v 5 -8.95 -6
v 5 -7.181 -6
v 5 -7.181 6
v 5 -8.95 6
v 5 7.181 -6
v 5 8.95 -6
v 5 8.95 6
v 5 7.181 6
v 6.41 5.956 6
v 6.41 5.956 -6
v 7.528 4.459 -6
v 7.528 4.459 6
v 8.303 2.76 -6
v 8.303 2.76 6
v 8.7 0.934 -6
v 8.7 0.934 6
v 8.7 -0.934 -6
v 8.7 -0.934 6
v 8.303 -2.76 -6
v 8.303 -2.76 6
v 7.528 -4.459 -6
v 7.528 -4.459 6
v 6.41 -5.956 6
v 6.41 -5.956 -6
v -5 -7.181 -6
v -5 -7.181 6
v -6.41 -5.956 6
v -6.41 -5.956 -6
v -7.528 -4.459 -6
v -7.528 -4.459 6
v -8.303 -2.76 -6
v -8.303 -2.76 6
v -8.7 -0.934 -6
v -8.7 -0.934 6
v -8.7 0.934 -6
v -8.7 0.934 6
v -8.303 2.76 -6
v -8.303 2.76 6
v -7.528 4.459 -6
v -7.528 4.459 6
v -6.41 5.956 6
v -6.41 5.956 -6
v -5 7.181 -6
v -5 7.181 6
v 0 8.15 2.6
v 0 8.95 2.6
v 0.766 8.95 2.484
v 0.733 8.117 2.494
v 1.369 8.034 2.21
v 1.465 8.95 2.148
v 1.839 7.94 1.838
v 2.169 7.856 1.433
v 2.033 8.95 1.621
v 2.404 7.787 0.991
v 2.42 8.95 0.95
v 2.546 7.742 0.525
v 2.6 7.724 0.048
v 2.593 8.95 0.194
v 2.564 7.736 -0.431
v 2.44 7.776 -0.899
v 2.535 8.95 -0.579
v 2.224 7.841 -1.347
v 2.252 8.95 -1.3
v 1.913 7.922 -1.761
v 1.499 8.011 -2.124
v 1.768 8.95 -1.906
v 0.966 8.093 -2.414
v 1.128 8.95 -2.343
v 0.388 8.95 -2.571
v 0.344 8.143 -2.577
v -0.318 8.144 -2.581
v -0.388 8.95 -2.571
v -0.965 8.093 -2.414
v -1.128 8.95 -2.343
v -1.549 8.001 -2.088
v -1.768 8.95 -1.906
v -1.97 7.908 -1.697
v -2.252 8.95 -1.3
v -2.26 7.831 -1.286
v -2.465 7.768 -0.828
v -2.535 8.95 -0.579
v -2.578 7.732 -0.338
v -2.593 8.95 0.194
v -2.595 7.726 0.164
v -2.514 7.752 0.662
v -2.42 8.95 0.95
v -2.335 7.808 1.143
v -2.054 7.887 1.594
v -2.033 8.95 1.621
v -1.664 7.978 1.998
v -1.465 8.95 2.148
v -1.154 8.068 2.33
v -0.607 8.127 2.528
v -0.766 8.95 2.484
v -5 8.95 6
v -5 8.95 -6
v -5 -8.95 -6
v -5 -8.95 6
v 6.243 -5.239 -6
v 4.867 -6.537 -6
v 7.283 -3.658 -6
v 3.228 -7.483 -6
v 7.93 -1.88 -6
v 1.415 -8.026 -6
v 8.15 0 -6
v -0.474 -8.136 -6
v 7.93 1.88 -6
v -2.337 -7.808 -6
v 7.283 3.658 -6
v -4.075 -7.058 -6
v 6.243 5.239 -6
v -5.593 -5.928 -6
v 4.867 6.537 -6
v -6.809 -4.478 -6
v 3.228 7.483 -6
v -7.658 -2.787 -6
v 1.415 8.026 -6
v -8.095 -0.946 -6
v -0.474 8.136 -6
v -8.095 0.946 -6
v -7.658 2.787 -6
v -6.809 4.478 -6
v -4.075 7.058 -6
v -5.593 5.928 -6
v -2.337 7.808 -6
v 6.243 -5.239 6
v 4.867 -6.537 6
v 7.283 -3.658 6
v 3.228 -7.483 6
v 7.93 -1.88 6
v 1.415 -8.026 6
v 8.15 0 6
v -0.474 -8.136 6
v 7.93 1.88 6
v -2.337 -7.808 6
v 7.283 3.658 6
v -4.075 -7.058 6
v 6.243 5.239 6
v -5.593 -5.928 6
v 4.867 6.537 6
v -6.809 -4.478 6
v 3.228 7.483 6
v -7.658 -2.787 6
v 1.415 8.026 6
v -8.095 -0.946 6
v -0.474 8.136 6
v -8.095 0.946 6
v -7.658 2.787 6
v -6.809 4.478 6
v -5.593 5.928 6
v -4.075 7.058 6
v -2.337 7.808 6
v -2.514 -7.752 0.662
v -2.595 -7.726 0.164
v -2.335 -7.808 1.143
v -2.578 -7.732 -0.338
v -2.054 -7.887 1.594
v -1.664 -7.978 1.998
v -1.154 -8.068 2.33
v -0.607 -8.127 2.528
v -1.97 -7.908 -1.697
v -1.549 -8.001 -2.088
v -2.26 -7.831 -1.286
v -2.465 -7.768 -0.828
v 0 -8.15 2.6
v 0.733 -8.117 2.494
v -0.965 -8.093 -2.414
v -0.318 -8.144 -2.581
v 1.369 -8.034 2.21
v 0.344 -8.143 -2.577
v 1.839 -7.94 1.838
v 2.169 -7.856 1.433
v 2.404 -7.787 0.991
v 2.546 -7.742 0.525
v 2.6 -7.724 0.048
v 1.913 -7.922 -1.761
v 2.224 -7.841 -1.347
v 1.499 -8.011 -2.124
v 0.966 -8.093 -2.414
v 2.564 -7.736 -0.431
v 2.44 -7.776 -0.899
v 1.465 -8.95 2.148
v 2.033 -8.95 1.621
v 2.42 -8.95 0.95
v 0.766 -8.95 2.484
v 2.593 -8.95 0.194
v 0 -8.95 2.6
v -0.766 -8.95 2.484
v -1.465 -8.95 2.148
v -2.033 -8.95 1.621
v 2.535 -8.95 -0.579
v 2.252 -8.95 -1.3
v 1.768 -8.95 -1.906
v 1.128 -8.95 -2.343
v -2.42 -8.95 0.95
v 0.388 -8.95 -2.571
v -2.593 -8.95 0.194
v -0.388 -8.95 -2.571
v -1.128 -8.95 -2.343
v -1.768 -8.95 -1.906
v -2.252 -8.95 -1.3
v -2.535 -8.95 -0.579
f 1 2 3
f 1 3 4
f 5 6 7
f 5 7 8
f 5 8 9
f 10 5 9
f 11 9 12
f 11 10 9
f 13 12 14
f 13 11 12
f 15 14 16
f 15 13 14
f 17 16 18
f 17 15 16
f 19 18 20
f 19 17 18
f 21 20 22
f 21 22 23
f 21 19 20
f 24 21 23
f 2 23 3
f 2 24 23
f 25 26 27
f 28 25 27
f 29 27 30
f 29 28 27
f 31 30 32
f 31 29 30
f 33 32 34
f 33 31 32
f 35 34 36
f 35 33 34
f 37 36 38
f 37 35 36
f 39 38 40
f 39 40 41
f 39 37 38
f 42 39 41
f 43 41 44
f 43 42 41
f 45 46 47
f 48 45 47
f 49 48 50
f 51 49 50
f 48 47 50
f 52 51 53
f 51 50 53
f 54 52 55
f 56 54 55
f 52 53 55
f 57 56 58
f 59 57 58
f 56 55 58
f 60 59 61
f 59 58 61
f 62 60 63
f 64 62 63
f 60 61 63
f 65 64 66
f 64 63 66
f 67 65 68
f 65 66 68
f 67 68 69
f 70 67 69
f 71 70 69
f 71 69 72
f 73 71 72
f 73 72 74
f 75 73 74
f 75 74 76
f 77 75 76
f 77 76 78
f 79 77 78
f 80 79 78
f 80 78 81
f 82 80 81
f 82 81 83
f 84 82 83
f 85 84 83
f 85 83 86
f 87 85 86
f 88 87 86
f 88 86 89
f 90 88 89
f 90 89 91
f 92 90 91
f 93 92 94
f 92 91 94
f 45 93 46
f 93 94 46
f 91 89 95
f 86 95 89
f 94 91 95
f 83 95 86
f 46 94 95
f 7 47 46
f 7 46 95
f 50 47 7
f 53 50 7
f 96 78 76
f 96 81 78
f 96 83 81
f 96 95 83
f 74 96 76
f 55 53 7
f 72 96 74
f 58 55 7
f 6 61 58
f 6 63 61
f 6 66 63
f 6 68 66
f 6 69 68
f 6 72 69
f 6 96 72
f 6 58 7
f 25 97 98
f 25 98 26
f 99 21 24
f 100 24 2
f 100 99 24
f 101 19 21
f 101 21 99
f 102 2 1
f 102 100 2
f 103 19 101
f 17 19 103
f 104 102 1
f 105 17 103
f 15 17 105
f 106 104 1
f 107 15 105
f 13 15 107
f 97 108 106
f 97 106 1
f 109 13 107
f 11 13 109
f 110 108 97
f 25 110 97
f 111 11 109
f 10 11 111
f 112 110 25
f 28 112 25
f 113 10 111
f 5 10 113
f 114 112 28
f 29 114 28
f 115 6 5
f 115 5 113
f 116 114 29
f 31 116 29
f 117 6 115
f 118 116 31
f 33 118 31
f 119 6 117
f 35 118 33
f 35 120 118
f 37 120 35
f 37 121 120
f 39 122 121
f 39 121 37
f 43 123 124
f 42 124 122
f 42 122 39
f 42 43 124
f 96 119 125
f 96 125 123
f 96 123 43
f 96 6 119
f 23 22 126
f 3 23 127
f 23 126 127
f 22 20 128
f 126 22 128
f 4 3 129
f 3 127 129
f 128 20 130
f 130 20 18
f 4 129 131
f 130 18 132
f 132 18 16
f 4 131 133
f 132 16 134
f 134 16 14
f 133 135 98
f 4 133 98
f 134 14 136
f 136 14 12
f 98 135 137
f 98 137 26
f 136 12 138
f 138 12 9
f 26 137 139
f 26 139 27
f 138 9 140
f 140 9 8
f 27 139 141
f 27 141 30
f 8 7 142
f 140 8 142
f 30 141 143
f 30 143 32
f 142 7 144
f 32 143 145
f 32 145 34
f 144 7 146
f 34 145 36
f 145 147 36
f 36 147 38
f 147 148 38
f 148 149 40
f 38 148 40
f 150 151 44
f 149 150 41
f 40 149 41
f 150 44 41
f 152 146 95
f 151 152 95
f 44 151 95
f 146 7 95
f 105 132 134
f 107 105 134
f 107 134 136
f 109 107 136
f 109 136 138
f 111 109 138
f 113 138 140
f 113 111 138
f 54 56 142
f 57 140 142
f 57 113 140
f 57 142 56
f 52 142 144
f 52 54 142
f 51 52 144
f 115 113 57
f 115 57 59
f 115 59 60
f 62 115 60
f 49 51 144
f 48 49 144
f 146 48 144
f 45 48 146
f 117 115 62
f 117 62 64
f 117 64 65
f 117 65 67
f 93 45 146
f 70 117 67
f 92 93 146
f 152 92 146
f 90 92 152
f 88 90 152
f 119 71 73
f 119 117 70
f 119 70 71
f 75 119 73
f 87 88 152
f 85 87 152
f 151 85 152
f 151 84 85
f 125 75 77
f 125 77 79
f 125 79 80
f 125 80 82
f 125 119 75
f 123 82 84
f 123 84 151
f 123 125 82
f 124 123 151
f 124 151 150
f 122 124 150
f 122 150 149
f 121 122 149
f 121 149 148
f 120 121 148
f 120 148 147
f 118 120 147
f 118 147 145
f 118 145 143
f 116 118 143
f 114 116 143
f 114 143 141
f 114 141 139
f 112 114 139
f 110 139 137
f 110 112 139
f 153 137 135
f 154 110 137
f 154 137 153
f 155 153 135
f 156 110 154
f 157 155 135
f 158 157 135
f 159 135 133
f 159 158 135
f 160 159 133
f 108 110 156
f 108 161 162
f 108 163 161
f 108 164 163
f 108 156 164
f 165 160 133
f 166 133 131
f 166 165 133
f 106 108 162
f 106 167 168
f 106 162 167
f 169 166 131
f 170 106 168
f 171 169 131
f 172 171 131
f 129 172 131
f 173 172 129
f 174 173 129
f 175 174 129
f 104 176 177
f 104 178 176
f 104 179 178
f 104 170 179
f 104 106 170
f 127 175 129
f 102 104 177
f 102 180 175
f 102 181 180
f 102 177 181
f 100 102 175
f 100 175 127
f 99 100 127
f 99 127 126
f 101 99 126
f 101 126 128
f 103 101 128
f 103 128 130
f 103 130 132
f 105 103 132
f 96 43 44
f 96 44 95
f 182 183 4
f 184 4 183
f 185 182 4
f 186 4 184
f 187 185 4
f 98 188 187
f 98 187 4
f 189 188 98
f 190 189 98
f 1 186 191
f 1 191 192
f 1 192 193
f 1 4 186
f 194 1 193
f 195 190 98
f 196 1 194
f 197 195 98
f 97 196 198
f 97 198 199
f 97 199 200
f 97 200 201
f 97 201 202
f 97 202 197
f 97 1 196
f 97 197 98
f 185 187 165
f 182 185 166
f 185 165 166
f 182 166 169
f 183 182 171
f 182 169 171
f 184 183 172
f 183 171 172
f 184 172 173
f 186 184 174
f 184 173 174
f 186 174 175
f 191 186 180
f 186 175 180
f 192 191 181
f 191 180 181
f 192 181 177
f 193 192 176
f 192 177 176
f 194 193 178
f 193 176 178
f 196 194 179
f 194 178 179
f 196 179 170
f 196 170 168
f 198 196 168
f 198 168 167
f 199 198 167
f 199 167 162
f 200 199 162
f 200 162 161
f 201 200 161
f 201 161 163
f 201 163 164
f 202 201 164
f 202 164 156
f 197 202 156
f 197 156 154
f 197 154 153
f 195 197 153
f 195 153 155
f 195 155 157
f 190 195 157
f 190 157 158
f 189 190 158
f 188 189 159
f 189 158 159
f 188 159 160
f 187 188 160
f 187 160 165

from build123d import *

# Parameters (mm, degrees)
BOSS_EXTRUDE2_DEPTH      = 6
BOSS_EXTRUDE2_DEPTH_BACK = 6
SKETCH1_R                = 8.15
SKETCH2_R                = 2.6
CUT_EXTRUDE1_DEPTH       = 21.807991253


with BuildPart() as part:
    # Sketch1 → Boss-Extrude2 (new, two sides: drawn at the far end of the back side and taken through both)
    with BuildSketch(Plane.XY.offset(-BOSS_EXTRUDE2_DEPTH_BACK)):
        with BuildLine():
            Line((-5, 8.95), (5, 8.95))
            Line((5, 8.95), (5, 7.180703308))
            ThreePointArc((5, 7.180703308), (8.75, 0), (5, -7.180703308))
            Line((5, -7.180703308), (5, -8.95))
            Line((5, -8.95), (-5, -8.95))
            Line((-5, -8.95), (-5, -7.180703308))
            ThreePointArc((-5, -7.180703308), (-8.75, 0), (-5, 7.180703308))
            Line((-5, 7.180703308), (-5, 8.95))
        make_face()
        Circle(SKETCH1_R, mode=Mode.SUBTRACT)
    extrude(amount=BOSS_EXTRUDE2_DEPTH + BOSS_EXTRUDE2_DEPTH_BACK)

    # Sketch2 → Cut-Extrude1 (cut, through all)
    with BuildSketch(Plane(origin=(0, 8.95, 0), x_dir=(1, 0, 0), z_dir=(0, 1, 0))):
        Circle(SKETCH2_R)
    extrude(amount=-CUT_EXTRUDE1_DEPTH, mode=Mode.SUBTRACT)


solid = part.part
